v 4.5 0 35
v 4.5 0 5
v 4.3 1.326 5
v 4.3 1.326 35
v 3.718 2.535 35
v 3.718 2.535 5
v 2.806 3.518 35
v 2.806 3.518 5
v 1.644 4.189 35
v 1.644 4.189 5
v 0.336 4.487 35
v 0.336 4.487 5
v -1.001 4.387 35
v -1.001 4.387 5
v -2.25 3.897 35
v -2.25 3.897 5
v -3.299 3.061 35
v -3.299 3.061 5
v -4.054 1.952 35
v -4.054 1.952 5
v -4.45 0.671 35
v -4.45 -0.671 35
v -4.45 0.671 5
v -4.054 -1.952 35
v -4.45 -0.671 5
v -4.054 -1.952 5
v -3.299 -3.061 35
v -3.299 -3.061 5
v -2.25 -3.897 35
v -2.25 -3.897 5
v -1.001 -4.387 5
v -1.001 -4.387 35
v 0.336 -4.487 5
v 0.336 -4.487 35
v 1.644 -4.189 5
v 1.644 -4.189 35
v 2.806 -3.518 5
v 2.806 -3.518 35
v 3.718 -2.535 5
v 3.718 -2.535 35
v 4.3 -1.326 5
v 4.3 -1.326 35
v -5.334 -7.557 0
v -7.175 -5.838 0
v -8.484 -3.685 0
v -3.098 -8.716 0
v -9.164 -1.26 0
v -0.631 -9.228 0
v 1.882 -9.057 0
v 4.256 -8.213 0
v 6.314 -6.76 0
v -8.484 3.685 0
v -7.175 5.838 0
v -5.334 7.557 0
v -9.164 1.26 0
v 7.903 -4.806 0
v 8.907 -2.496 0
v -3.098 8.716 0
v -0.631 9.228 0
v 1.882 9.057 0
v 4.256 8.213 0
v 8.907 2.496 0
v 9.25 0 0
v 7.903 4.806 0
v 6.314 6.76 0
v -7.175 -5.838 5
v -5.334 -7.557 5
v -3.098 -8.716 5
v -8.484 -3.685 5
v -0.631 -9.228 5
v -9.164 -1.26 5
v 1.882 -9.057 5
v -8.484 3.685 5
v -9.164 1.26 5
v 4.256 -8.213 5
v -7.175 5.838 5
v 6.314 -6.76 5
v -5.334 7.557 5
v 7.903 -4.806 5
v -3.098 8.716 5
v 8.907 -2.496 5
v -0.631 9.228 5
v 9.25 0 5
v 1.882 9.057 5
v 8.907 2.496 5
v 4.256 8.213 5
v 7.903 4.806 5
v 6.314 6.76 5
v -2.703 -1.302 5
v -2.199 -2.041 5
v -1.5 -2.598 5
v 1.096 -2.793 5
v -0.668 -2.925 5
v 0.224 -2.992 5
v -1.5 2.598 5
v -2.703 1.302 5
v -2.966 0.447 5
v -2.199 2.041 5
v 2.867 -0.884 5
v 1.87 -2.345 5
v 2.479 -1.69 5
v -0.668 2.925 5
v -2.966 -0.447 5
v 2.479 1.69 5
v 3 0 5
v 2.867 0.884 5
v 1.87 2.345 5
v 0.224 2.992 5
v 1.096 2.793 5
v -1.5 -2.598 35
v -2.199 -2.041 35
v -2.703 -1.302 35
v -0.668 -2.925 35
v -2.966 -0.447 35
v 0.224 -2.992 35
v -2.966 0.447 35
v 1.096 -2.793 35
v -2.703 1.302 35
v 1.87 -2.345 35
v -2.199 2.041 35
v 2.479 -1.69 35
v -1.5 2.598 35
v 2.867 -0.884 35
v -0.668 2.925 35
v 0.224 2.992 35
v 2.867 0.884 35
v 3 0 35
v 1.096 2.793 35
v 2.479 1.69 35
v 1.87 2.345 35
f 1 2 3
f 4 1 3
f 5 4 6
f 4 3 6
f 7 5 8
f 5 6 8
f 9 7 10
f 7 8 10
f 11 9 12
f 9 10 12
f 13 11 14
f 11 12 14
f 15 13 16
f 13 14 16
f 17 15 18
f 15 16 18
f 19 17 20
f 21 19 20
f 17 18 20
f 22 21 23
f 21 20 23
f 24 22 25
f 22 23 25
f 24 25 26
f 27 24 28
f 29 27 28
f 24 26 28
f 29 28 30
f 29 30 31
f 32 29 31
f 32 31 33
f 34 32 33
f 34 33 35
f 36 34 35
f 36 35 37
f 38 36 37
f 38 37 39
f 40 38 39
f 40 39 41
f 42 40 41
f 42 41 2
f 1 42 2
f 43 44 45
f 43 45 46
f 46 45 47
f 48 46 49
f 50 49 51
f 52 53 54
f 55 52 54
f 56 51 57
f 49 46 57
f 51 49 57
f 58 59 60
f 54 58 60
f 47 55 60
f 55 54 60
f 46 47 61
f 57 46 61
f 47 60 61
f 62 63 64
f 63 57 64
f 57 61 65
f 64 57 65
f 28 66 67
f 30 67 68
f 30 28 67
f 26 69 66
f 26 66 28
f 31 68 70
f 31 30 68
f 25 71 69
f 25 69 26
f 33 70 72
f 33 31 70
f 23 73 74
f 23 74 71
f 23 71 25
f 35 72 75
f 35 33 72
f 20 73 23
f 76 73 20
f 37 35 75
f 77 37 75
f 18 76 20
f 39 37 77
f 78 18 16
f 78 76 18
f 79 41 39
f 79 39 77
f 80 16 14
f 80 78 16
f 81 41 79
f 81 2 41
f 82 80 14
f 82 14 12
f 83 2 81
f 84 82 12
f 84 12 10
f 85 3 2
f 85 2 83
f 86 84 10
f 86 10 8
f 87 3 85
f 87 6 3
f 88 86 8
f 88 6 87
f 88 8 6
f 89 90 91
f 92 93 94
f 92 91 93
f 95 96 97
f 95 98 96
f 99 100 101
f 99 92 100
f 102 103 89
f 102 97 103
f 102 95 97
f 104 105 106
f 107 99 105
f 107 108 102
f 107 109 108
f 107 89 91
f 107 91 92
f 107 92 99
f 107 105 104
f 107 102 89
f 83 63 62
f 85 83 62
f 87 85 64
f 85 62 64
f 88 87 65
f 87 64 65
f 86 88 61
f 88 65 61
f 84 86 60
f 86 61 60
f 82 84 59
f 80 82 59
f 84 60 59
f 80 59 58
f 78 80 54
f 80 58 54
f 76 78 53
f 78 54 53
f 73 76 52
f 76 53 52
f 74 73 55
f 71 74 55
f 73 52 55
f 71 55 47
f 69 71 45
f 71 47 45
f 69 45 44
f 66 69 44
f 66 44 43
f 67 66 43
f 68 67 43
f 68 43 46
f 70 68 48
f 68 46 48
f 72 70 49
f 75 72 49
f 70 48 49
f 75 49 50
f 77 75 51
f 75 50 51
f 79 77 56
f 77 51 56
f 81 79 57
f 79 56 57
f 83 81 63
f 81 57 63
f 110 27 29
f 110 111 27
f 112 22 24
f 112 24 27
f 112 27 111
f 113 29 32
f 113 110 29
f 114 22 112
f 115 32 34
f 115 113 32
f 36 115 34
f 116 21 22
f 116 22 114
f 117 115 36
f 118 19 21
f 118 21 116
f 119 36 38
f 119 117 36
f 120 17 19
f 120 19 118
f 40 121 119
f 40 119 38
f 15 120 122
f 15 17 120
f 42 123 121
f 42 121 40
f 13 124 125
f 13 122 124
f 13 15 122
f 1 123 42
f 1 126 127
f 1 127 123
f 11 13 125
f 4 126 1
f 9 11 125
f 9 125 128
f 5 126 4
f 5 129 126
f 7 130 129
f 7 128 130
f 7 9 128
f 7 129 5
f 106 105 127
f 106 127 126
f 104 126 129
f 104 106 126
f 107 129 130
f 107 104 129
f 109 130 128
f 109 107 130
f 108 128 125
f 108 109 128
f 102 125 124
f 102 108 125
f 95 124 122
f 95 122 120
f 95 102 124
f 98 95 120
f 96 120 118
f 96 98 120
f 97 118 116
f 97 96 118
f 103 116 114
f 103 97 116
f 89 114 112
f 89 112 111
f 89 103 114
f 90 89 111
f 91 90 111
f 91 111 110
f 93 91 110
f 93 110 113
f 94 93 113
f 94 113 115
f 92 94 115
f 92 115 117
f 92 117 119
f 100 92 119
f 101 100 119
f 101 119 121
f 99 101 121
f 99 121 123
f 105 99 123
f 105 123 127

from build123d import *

# Parameters (mm, degrees)
CROQUIS1_R              = 9.25
SALIENTE_EXTRUIR1_DEPTH = 5
CROQUIS1_6_R            = 4.5
CROQUIS1_6_R_2          = 3
EXTRUIR_L_MINA1_DEPTH   = 35


with BuildPart() as part:
    # Croquis1 → Saliente-Extruir1 (new body)
    with BuildSketch(Plane.XY):
        Circle(CROQUIS1_R)
    extrude(amount=SALIENTE_EXTRUIR1_DEPTH)

    # Croquis1<6> → Extruir-Lámina1 (add)
    with BuildSketch(Plane.XY):
        Circle(CROQUIS1_6_R)
        Circle(CROQUIS1_6_R_2, mode=Mode.SUBTRACT)
    extrude(amount=EXTRUIR_L_MINA1_DEPTH)


solid = part.part
